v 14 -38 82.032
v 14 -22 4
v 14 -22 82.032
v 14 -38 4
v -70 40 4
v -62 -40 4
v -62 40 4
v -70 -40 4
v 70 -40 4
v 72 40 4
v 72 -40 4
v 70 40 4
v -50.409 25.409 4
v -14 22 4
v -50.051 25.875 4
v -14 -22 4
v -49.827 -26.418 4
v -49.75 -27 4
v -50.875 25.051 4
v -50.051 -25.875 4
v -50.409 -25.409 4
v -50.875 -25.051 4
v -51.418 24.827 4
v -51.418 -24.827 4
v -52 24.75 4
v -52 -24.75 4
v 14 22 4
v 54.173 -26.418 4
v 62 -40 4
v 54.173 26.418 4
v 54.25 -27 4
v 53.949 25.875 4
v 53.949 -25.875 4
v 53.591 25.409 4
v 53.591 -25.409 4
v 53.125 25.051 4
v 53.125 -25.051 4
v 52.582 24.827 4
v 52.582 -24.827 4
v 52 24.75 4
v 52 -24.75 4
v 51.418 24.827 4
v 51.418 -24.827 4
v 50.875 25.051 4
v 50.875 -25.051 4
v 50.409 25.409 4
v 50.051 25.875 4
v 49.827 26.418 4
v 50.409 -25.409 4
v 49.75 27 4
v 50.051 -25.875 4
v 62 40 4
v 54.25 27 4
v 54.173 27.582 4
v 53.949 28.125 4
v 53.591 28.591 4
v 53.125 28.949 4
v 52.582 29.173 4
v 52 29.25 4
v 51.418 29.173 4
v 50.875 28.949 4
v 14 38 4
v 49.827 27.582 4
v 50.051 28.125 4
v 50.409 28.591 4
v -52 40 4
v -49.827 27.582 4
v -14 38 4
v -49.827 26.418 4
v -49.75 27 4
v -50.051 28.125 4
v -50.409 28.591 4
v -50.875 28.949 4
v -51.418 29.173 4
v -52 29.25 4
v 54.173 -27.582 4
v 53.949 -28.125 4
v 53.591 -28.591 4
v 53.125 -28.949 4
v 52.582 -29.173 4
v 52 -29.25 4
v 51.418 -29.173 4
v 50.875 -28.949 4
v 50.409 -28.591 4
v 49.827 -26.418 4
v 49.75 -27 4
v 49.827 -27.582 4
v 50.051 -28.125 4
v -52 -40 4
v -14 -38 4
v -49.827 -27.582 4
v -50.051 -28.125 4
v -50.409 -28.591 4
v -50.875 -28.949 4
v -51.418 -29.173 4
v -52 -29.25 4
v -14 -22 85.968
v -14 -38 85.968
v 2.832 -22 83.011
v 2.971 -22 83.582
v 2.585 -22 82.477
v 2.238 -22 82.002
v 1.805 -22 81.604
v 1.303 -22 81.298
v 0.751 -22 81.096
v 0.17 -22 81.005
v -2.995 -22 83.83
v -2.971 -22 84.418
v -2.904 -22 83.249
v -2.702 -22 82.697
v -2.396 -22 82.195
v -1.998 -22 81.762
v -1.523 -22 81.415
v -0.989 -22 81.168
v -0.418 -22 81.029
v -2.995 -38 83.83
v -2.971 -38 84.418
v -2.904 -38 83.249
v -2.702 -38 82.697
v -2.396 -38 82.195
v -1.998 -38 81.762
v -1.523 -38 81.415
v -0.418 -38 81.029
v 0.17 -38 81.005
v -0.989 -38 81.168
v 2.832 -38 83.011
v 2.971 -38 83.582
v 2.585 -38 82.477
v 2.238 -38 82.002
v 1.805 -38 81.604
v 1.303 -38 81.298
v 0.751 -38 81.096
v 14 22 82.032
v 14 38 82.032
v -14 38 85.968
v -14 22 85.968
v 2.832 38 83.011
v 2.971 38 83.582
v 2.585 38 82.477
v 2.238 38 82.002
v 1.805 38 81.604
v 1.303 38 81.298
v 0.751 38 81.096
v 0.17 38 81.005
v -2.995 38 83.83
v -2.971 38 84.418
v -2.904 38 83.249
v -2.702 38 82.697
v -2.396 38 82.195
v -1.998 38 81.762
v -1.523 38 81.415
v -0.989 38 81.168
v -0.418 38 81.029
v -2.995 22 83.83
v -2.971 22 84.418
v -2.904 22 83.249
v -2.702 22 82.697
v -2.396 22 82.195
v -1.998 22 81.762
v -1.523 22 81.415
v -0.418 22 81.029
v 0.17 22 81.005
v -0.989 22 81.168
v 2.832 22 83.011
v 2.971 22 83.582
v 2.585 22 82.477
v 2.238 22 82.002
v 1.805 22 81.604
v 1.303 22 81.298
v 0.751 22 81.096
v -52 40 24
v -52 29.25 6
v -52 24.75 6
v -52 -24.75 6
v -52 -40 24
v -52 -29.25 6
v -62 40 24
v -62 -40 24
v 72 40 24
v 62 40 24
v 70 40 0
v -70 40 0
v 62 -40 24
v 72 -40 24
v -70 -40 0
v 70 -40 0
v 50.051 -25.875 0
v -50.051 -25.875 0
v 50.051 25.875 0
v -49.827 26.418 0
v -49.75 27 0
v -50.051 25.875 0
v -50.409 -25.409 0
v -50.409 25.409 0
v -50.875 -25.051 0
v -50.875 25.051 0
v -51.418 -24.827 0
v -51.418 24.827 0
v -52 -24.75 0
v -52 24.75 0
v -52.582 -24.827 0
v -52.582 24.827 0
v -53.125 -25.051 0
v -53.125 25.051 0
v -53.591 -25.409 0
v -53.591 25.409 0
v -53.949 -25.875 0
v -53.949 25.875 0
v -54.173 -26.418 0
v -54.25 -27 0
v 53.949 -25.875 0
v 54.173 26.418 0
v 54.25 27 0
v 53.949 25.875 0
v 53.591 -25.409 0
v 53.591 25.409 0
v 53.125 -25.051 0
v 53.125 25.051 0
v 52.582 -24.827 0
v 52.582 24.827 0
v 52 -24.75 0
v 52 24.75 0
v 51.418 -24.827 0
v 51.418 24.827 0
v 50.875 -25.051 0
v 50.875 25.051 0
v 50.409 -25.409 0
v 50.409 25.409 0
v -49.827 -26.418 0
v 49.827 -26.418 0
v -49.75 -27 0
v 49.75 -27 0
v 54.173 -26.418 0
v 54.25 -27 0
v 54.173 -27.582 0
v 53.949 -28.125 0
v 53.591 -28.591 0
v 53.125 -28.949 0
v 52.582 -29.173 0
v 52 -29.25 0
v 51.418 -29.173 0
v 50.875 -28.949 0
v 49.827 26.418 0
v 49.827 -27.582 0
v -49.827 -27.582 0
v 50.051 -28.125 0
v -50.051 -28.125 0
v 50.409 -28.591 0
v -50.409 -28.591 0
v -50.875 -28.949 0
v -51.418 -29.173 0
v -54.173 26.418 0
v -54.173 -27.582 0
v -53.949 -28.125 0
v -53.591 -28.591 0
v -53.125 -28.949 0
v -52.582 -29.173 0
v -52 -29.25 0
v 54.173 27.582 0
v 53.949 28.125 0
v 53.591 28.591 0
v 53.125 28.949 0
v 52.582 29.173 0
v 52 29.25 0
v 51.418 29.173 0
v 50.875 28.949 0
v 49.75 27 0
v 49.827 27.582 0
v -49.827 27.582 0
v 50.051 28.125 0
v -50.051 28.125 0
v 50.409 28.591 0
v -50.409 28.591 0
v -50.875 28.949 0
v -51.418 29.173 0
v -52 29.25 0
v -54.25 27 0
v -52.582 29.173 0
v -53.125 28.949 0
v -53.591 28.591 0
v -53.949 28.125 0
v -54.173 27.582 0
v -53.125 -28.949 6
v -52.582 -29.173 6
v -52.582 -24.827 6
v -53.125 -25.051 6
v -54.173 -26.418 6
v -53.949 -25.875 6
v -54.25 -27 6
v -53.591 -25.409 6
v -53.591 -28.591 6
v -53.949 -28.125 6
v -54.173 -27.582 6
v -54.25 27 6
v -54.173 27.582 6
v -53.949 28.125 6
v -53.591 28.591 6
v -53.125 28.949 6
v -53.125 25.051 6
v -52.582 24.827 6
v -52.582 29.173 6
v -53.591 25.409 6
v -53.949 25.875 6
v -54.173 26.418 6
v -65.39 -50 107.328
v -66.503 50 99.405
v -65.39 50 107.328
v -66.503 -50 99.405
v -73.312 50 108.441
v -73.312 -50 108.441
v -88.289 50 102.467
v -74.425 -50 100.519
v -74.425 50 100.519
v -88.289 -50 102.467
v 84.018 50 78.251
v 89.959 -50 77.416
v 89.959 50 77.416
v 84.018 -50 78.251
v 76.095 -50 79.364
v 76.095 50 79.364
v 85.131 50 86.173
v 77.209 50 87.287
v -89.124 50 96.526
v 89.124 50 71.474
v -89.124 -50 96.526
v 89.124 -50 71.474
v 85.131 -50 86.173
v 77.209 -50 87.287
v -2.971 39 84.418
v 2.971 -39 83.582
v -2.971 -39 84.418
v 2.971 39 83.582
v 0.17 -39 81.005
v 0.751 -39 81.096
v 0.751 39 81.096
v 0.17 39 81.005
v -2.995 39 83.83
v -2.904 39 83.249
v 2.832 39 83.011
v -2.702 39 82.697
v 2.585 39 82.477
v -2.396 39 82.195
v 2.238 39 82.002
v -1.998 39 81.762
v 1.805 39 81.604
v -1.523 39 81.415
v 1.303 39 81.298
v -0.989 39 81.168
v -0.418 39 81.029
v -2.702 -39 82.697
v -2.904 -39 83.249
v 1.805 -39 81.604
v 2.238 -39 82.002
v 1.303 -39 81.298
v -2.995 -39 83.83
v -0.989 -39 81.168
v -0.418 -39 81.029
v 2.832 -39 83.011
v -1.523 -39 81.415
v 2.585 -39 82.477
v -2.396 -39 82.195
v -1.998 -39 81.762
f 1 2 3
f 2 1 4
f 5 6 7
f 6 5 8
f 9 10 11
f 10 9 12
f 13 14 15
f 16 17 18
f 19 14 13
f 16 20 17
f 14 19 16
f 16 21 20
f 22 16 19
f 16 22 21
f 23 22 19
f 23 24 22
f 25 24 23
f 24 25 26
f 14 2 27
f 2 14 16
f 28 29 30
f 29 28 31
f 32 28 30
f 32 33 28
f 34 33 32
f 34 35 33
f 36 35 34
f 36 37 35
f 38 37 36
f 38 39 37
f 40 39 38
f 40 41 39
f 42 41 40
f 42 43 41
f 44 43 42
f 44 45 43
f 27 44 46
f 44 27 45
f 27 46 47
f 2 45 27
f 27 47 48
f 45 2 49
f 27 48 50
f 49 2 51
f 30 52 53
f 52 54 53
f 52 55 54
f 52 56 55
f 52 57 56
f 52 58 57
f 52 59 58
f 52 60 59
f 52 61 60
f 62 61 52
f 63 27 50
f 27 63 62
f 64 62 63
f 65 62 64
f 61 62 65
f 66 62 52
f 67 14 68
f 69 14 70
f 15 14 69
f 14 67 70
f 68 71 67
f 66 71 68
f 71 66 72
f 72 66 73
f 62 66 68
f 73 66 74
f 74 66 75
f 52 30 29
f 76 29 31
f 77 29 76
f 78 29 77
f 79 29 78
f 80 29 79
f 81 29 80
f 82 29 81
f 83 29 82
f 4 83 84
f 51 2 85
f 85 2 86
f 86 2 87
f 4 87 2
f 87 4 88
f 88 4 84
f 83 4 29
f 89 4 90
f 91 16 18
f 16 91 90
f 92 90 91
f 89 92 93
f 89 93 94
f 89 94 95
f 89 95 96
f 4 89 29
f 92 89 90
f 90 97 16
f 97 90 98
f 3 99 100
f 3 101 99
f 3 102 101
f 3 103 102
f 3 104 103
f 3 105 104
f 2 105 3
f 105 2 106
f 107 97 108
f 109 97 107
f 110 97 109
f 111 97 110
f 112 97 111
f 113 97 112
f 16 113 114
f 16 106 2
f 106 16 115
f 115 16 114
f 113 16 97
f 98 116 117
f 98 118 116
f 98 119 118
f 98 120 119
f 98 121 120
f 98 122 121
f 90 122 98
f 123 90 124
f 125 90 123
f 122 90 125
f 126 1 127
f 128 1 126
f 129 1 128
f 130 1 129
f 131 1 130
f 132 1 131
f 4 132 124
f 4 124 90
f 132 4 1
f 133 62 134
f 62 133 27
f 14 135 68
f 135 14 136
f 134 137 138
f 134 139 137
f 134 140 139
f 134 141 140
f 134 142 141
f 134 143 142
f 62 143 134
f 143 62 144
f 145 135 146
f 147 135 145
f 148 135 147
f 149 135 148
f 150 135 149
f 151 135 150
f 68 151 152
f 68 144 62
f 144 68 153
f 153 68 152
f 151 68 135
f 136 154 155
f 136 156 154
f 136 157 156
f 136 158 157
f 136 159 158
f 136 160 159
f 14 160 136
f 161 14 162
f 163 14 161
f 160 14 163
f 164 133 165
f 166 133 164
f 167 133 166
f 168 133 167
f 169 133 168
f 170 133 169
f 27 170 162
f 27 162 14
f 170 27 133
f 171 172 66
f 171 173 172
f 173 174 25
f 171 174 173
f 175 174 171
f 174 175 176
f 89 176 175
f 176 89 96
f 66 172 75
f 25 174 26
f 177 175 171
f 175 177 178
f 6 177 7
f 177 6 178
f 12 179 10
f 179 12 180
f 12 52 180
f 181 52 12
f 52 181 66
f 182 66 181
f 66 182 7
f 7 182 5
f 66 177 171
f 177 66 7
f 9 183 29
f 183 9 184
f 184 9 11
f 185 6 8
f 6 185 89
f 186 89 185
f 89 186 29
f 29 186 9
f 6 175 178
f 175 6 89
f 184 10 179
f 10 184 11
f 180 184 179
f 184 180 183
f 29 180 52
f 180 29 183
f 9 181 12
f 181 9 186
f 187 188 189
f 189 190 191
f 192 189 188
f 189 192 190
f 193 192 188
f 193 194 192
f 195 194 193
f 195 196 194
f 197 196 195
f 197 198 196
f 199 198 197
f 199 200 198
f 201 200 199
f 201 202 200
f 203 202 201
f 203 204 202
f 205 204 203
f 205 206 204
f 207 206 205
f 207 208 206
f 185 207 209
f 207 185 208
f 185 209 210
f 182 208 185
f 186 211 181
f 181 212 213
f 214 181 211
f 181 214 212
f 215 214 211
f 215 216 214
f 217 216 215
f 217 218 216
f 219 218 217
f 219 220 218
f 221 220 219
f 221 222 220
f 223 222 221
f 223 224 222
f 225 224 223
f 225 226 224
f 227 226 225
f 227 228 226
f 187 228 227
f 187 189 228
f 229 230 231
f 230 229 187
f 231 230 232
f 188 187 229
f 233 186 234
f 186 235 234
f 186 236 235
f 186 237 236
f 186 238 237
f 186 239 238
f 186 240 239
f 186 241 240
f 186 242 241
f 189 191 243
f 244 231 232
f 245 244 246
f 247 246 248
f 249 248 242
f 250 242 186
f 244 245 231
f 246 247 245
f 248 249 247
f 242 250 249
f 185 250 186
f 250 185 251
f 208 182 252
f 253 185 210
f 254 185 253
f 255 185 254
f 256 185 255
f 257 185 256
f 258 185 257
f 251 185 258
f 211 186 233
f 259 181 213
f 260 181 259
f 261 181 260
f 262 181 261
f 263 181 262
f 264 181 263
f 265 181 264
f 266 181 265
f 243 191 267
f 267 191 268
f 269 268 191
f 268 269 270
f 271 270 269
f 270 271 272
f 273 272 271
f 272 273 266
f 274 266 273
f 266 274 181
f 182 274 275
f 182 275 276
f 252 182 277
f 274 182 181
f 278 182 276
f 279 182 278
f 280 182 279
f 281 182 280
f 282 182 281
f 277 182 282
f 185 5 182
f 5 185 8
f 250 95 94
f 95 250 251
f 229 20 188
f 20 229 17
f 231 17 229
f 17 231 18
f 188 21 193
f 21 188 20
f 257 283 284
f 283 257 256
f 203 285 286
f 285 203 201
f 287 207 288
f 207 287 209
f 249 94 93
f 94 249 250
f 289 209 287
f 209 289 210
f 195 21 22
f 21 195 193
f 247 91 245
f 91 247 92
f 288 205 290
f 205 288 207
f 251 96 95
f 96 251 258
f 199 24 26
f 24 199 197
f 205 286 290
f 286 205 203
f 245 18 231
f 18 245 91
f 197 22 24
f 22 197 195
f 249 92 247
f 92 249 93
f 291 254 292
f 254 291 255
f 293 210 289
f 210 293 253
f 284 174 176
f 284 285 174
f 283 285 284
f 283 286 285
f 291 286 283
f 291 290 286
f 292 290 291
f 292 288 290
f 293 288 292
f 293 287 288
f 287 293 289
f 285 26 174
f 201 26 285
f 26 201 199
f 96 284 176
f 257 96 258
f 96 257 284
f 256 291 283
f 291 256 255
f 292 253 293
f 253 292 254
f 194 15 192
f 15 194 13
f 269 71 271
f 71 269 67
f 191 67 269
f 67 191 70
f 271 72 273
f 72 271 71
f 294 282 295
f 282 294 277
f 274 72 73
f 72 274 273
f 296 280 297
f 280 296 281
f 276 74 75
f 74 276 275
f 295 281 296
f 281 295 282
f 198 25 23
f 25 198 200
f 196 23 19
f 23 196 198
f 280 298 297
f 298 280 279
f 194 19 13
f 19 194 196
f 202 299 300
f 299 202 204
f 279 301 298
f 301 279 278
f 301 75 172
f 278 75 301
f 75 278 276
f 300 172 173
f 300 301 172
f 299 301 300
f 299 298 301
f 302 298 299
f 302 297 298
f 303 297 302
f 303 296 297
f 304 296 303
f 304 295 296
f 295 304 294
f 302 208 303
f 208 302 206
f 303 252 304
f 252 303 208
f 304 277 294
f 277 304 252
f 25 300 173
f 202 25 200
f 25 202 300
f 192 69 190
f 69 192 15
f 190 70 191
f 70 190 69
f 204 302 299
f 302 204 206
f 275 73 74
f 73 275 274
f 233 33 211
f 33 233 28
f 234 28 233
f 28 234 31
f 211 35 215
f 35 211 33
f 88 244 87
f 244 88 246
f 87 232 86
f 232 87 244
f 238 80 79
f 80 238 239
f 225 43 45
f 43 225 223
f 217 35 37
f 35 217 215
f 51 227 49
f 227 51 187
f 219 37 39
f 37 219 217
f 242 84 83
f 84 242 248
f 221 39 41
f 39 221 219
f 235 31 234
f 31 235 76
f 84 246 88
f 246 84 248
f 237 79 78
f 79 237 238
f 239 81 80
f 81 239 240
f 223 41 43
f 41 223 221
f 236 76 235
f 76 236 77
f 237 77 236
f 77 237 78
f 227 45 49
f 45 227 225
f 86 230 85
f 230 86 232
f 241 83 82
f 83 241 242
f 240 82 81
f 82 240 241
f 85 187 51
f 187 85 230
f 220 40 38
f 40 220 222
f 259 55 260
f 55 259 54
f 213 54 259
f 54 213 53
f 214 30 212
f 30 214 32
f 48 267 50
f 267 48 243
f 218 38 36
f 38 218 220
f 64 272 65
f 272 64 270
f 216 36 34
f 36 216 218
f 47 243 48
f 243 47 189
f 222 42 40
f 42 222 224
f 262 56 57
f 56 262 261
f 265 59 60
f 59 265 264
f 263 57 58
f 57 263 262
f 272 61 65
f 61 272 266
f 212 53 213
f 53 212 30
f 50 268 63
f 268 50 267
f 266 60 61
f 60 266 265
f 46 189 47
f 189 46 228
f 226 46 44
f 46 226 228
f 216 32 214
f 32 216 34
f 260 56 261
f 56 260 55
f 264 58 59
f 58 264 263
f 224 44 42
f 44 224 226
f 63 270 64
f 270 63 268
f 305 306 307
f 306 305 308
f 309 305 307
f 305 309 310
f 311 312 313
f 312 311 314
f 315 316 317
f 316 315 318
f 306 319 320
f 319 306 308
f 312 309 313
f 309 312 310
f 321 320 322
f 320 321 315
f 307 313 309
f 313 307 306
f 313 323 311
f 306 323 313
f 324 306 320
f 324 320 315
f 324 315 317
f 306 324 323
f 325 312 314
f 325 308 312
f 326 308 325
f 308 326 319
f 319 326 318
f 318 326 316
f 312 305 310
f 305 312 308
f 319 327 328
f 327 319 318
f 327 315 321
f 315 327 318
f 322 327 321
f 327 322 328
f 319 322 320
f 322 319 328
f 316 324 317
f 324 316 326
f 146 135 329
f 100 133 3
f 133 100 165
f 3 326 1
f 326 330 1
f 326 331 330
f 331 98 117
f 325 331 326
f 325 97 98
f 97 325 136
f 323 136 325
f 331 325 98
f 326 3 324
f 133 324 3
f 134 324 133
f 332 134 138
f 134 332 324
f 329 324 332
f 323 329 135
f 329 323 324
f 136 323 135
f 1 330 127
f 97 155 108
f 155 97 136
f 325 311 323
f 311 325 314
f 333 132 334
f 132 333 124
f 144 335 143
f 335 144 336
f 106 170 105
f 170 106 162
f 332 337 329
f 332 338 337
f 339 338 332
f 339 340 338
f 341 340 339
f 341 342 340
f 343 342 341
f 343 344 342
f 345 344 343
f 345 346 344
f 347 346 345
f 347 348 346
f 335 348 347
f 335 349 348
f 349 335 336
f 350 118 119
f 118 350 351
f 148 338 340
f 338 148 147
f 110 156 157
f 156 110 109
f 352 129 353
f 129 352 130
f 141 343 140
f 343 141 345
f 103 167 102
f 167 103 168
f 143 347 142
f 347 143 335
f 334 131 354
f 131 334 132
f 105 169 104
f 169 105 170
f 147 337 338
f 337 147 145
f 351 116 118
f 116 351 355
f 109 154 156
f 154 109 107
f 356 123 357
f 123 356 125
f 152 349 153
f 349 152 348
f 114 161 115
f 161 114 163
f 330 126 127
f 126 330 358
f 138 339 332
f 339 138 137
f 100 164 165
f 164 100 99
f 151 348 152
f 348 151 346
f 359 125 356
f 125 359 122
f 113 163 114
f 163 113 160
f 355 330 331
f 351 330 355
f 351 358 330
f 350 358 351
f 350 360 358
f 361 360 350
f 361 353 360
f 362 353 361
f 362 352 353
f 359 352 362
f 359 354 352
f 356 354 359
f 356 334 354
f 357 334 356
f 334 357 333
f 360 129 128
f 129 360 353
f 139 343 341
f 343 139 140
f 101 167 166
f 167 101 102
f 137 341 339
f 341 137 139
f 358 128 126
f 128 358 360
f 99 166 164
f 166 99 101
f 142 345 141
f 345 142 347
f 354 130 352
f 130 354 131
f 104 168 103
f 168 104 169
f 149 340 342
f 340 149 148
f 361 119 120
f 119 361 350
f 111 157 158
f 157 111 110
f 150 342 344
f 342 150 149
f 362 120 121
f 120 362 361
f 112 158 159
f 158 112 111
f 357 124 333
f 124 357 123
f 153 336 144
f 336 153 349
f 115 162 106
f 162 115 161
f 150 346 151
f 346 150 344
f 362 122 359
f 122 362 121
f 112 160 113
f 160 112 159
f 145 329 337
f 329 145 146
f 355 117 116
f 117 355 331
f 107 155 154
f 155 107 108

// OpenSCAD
// file: ../models/drone-playground-seesaw-deck/model.scad
deck_length=180; deck_depth=100; deck_thickness=6; axle_diameter=6; axle_length=78;
module seesaw_deck(){ union(){ translate([-deck_length/2,-deck_depth/2,3]) cube([deck_length,deck_depth,deck_thickness]); translate([0,0,3]) rotate([90,0,0]) cylinder(d=axle_diameter,h=axle_length,center=true,$fn=32); for(x=[-76,76]) translate([x,-deck_depth/2,9]) cube([8,deck_depth,8]); }}
assert(deck_length==180 && axle_diameter==6); echo("SCADCTL_REQUIREMENT:parameters:PASS"); seesaw_deck();
// file: ../models/drone-playground-seesaw-base/model.scad
base_length=140; base_depth=80; pivot_height=82; axle_bore=6.6; mount_hole_diameter=4.5;
module saddle(y){ difference(){ translate([-14,y-8,4]) cube([28,16,pivot_height]); translate([0,y,pivot_height+4]) rotate([90,0,0]) cylinder(d=axle_bore,h=20,center=true,$fn=32); translate([-axle_bore/2,y-11,pivot_height+4]) cube([axle_bore,22,15]); }}
module seesaw_base(){ difference(){ union(){ translate([-base_length/2,-base_depth/2,0]) cube([base_length,base_depth,4]); saddle(-30); saddle(30); for(x=[-62,62]) translate([x,-base_depth/2,4]) cube([10,base_depth,20]); } for(x=[-52,52],y=[-27,27]) translate([x,y,-1]) cylinder(d=mount_hole_diameter,h=7,$fn=24); }}
assert(axle_bore==6.6 && pivot_height==82); echo("SCADCTL_REQUIREMENT:parameters:PASS"); seesaw_base();
// main file
use <../models/drone-playground-seesaw-base/model.scad>
use <../models/drone-playground-seesaw-deck/model.scad>
color("slategray") seesaw_base();
color("orange") translate([0,0,84]) rotate([0,8,0]) translate([0,0,-3]) seesaw_deck();
